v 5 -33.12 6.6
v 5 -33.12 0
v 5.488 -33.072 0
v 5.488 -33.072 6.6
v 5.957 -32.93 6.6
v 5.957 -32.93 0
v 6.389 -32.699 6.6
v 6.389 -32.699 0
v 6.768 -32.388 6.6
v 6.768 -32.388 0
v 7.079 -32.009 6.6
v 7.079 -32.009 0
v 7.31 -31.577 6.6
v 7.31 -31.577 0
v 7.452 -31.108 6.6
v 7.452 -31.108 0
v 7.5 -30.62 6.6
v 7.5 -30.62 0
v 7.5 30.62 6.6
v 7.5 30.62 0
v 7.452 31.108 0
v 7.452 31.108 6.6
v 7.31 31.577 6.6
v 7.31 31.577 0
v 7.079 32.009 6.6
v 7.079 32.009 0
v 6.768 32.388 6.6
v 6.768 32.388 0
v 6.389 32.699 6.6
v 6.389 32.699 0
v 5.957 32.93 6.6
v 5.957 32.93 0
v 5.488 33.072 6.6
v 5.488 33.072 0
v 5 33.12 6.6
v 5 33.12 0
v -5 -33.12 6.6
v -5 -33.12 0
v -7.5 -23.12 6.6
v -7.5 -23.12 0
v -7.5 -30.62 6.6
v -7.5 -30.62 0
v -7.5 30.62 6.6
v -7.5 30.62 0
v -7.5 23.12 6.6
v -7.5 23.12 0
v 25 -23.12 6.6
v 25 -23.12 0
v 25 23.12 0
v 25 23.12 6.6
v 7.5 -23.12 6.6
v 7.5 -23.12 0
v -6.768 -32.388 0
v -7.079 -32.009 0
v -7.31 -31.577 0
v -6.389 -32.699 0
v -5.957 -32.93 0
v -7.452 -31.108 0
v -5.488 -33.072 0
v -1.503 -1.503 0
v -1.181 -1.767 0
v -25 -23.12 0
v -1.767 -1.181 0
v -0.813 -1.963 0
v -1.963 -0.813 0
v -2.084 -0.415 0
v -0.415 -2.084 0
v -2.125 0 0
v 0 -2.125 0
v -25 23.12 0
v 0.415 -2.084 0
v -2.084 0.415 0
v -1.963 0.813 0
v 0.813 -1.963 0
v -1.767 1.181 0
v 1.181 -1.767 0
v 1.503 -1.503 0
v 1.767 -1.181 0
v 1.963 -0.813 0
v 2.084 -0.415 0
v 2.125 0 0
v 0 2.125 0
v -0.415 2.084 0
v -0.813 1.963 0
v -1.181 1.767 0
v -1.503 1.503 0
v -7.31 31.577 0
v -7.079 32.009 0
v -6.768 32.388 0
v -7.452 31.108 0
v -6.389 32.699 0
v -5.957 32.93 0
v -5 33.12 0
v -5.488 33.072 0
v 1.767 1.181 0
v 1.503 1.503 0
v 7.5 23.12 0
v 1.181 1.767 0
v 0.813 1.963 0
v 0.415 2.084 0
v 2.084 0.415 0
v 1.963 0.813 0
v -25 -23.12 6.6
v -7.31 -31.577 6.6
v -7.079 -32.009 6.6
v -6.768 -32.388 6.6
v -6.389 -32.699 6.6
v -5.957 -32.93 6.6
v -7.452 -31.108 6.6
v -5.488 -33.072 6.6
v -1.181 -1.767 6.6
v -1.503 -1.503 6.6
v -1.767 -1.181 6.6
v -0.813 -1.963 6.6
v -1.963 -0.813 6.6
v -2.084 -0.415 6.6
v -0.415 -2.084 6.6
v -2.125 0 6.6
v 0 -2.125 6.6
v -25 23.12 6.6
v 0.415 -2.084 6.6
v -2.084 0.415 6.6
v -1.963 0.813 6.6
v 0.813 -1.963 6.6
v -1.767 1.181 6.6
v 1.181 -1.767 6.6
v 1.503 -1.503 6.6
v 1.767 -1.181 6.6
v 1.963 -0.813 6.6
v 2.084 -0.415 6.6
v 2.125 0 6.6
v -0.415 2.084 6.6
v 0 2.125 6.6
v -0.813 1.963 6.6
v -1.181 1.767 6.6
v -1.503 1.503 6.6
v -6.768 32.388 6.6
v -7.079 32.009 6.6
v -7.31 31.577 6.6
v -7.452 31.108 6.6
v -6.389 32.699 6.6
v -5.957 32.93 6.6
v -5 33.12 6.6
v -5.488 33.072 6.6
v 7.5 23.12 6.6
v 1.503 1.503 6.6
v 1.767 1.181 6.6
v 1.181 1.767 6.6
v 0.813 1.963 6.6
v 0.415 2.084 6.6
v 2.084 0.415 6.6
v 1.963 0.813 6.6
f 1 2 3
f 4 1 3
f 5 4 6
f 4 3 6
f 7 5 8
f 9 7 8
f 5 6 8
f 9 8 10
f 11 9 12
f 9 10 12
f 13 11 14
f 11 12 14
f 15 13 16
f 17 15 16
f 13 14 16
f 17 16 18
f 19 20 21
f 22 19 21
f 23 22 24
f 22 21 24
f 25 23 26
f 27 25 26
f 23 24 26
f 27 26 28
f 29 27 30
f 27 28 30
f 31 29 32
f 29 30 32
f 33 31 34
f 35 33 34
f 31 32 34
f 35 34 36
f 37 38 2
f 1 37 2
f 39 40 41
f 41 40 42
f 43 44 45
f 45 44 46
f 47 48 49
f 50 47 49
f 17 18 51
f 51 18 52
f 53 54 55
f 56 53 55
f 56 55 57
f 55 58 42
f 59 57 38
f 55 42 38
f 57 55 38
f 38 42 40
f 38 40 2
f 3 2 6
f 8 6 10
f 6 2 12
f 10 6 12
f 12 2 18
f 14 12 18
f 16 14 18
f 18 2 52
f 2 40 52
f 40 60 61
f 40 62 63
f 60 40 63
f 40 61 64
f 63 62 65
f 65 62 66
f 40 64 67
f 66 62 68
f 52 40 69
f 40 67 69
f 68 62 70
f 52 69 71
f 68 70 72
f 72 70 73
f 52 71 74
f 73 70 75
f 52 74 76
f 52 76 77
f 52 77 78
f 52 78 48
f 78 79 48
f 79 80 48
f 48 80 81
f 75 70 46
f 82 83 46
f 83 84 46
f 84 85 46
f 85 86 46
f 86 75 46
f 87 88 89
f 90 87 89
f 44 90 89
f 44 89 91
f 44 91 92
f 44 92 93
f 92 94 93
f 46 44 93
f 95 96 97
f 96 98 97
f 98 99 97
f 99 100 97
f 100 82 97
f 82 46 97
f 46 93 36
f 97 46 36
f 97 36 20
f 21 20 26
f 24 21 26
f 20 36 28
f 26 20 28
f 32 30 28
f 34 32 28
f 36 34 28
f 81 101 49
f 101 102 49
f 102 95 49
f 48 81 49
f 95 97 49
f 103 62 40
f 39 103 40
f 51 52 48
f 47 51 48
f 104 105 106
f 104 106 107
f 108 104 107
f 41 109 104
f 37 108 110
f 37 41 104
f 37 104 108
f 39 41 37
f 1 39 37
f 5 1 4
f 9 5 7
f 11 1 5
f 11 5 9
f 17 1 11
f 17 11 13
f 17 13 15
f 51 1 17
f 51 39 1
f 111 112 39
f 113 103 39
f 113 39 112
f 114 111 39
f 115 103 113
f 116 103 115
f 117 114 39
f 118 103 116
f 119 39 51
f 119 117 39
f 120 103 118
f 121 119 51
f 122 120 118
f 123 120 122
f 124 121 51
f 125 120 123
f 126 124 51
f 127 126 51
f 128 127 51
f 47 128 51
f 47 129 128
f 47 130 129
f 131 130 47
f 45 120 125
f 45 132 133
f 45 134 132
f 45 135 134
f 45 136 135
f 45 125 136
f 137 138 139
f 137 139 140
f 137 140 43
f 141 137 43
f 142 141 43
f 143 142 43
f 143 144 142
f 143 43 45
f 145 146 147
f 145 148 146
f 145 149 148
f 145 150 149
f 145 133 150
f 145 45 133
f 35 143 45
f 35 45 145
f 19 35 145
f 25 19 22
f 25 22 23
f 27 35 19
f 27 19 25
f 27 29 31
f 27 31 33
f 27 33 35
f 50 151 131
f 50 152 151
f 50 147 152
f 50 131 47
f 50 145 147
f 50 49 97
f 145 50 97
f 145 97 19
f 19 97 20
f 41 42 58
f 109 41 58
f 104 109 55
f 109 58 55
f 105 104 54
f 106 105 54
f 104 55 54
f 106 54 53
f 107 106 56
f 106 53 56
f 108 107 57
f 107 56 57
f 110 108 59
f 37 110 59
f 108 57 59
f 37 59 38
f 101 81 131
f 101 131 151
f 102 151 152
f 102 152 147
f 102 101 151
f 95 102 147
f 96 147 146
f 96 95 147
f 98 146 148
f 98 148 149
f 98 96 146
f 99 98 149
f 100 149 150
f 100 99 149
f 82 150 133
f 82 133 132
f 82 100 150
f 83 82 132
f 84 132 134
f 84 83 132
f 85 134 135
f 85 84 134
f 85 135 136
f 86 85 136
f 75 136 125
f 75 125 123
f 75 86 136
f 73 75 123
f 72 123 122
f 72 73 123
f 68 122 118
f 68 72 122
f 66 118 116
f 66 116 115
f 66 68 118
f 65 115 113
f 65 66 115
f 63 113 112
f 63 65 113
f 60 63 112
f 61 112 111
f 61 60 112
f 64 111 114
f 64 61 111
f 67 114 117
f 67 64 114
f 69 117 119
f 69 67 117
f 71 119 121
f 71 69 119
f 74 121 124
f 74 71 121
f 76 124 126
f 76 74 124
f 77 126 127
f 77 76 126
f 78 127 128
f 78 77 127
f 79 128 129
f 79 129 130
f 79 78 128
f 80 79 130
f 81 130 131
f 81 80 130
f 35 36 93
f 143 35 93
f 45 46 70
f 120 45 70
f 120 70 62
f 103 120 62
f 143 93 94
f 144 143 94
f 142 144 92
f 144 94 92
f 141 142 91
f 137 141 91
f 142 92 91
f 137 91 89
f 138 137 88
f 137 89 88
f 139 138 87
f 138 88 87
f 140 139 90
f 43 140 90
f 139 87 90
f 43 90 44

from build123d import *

# Parameters (mm, degrees)
MODEL_R             = 2.125
BOSS_EXTRUDE1_DEPTH = 6.6


with BuildPart() as part:
    # Model → Boss-Extrude1 (new body)
    with BuildSketch(Plane.XY):
        with BuildLine():
            Line((-25, 23.12), (-25, -23.12))
            Line((-25, -23.12), (-7.5, -23.12))
            Line((-7.5, -23.12), (-7.5, -30.62))
            ThreePointArc((-7.5, -30.62), (-6.767766953, -32.387766953), (-5, -33.12))
            Line((-5, -33.12), (5, -33.12))
            ThreePointArc((5, -33.12), (6.767766953, -32.387766953), (7.5, -30.62))
            Line((7.5, -30.62), (7.5, -23.12))
            Line((7.5, -23.12), (25, -23.12))
            Line((25, -23.12), (25, 23.12))
            Line((25, 23.12), (7.5, 23.12))
            Line((7.5, 23.12), (7.5, 30.62))
            ThreePointArc((7.5, 30.62), (6.767766953, 32.387766953), (5, 33.12))
            Line((5, 33.12), (-5, 33.12))
            ThreePointArc((-5, 33.12), (-6.767766953, 32.387766953), (-7.5, 30.62))
            Line((-7.5, 30.62), (-7.5, 23.12))
            Line((-7.5, 23.12), (-25, 23.12))
        make_face()
        Circle(MODEL_R, mode=Mode.SUBTRACT)
    extrude(amount=BOSS_EXTRUDE1_DEPTH)


solid = part.part
